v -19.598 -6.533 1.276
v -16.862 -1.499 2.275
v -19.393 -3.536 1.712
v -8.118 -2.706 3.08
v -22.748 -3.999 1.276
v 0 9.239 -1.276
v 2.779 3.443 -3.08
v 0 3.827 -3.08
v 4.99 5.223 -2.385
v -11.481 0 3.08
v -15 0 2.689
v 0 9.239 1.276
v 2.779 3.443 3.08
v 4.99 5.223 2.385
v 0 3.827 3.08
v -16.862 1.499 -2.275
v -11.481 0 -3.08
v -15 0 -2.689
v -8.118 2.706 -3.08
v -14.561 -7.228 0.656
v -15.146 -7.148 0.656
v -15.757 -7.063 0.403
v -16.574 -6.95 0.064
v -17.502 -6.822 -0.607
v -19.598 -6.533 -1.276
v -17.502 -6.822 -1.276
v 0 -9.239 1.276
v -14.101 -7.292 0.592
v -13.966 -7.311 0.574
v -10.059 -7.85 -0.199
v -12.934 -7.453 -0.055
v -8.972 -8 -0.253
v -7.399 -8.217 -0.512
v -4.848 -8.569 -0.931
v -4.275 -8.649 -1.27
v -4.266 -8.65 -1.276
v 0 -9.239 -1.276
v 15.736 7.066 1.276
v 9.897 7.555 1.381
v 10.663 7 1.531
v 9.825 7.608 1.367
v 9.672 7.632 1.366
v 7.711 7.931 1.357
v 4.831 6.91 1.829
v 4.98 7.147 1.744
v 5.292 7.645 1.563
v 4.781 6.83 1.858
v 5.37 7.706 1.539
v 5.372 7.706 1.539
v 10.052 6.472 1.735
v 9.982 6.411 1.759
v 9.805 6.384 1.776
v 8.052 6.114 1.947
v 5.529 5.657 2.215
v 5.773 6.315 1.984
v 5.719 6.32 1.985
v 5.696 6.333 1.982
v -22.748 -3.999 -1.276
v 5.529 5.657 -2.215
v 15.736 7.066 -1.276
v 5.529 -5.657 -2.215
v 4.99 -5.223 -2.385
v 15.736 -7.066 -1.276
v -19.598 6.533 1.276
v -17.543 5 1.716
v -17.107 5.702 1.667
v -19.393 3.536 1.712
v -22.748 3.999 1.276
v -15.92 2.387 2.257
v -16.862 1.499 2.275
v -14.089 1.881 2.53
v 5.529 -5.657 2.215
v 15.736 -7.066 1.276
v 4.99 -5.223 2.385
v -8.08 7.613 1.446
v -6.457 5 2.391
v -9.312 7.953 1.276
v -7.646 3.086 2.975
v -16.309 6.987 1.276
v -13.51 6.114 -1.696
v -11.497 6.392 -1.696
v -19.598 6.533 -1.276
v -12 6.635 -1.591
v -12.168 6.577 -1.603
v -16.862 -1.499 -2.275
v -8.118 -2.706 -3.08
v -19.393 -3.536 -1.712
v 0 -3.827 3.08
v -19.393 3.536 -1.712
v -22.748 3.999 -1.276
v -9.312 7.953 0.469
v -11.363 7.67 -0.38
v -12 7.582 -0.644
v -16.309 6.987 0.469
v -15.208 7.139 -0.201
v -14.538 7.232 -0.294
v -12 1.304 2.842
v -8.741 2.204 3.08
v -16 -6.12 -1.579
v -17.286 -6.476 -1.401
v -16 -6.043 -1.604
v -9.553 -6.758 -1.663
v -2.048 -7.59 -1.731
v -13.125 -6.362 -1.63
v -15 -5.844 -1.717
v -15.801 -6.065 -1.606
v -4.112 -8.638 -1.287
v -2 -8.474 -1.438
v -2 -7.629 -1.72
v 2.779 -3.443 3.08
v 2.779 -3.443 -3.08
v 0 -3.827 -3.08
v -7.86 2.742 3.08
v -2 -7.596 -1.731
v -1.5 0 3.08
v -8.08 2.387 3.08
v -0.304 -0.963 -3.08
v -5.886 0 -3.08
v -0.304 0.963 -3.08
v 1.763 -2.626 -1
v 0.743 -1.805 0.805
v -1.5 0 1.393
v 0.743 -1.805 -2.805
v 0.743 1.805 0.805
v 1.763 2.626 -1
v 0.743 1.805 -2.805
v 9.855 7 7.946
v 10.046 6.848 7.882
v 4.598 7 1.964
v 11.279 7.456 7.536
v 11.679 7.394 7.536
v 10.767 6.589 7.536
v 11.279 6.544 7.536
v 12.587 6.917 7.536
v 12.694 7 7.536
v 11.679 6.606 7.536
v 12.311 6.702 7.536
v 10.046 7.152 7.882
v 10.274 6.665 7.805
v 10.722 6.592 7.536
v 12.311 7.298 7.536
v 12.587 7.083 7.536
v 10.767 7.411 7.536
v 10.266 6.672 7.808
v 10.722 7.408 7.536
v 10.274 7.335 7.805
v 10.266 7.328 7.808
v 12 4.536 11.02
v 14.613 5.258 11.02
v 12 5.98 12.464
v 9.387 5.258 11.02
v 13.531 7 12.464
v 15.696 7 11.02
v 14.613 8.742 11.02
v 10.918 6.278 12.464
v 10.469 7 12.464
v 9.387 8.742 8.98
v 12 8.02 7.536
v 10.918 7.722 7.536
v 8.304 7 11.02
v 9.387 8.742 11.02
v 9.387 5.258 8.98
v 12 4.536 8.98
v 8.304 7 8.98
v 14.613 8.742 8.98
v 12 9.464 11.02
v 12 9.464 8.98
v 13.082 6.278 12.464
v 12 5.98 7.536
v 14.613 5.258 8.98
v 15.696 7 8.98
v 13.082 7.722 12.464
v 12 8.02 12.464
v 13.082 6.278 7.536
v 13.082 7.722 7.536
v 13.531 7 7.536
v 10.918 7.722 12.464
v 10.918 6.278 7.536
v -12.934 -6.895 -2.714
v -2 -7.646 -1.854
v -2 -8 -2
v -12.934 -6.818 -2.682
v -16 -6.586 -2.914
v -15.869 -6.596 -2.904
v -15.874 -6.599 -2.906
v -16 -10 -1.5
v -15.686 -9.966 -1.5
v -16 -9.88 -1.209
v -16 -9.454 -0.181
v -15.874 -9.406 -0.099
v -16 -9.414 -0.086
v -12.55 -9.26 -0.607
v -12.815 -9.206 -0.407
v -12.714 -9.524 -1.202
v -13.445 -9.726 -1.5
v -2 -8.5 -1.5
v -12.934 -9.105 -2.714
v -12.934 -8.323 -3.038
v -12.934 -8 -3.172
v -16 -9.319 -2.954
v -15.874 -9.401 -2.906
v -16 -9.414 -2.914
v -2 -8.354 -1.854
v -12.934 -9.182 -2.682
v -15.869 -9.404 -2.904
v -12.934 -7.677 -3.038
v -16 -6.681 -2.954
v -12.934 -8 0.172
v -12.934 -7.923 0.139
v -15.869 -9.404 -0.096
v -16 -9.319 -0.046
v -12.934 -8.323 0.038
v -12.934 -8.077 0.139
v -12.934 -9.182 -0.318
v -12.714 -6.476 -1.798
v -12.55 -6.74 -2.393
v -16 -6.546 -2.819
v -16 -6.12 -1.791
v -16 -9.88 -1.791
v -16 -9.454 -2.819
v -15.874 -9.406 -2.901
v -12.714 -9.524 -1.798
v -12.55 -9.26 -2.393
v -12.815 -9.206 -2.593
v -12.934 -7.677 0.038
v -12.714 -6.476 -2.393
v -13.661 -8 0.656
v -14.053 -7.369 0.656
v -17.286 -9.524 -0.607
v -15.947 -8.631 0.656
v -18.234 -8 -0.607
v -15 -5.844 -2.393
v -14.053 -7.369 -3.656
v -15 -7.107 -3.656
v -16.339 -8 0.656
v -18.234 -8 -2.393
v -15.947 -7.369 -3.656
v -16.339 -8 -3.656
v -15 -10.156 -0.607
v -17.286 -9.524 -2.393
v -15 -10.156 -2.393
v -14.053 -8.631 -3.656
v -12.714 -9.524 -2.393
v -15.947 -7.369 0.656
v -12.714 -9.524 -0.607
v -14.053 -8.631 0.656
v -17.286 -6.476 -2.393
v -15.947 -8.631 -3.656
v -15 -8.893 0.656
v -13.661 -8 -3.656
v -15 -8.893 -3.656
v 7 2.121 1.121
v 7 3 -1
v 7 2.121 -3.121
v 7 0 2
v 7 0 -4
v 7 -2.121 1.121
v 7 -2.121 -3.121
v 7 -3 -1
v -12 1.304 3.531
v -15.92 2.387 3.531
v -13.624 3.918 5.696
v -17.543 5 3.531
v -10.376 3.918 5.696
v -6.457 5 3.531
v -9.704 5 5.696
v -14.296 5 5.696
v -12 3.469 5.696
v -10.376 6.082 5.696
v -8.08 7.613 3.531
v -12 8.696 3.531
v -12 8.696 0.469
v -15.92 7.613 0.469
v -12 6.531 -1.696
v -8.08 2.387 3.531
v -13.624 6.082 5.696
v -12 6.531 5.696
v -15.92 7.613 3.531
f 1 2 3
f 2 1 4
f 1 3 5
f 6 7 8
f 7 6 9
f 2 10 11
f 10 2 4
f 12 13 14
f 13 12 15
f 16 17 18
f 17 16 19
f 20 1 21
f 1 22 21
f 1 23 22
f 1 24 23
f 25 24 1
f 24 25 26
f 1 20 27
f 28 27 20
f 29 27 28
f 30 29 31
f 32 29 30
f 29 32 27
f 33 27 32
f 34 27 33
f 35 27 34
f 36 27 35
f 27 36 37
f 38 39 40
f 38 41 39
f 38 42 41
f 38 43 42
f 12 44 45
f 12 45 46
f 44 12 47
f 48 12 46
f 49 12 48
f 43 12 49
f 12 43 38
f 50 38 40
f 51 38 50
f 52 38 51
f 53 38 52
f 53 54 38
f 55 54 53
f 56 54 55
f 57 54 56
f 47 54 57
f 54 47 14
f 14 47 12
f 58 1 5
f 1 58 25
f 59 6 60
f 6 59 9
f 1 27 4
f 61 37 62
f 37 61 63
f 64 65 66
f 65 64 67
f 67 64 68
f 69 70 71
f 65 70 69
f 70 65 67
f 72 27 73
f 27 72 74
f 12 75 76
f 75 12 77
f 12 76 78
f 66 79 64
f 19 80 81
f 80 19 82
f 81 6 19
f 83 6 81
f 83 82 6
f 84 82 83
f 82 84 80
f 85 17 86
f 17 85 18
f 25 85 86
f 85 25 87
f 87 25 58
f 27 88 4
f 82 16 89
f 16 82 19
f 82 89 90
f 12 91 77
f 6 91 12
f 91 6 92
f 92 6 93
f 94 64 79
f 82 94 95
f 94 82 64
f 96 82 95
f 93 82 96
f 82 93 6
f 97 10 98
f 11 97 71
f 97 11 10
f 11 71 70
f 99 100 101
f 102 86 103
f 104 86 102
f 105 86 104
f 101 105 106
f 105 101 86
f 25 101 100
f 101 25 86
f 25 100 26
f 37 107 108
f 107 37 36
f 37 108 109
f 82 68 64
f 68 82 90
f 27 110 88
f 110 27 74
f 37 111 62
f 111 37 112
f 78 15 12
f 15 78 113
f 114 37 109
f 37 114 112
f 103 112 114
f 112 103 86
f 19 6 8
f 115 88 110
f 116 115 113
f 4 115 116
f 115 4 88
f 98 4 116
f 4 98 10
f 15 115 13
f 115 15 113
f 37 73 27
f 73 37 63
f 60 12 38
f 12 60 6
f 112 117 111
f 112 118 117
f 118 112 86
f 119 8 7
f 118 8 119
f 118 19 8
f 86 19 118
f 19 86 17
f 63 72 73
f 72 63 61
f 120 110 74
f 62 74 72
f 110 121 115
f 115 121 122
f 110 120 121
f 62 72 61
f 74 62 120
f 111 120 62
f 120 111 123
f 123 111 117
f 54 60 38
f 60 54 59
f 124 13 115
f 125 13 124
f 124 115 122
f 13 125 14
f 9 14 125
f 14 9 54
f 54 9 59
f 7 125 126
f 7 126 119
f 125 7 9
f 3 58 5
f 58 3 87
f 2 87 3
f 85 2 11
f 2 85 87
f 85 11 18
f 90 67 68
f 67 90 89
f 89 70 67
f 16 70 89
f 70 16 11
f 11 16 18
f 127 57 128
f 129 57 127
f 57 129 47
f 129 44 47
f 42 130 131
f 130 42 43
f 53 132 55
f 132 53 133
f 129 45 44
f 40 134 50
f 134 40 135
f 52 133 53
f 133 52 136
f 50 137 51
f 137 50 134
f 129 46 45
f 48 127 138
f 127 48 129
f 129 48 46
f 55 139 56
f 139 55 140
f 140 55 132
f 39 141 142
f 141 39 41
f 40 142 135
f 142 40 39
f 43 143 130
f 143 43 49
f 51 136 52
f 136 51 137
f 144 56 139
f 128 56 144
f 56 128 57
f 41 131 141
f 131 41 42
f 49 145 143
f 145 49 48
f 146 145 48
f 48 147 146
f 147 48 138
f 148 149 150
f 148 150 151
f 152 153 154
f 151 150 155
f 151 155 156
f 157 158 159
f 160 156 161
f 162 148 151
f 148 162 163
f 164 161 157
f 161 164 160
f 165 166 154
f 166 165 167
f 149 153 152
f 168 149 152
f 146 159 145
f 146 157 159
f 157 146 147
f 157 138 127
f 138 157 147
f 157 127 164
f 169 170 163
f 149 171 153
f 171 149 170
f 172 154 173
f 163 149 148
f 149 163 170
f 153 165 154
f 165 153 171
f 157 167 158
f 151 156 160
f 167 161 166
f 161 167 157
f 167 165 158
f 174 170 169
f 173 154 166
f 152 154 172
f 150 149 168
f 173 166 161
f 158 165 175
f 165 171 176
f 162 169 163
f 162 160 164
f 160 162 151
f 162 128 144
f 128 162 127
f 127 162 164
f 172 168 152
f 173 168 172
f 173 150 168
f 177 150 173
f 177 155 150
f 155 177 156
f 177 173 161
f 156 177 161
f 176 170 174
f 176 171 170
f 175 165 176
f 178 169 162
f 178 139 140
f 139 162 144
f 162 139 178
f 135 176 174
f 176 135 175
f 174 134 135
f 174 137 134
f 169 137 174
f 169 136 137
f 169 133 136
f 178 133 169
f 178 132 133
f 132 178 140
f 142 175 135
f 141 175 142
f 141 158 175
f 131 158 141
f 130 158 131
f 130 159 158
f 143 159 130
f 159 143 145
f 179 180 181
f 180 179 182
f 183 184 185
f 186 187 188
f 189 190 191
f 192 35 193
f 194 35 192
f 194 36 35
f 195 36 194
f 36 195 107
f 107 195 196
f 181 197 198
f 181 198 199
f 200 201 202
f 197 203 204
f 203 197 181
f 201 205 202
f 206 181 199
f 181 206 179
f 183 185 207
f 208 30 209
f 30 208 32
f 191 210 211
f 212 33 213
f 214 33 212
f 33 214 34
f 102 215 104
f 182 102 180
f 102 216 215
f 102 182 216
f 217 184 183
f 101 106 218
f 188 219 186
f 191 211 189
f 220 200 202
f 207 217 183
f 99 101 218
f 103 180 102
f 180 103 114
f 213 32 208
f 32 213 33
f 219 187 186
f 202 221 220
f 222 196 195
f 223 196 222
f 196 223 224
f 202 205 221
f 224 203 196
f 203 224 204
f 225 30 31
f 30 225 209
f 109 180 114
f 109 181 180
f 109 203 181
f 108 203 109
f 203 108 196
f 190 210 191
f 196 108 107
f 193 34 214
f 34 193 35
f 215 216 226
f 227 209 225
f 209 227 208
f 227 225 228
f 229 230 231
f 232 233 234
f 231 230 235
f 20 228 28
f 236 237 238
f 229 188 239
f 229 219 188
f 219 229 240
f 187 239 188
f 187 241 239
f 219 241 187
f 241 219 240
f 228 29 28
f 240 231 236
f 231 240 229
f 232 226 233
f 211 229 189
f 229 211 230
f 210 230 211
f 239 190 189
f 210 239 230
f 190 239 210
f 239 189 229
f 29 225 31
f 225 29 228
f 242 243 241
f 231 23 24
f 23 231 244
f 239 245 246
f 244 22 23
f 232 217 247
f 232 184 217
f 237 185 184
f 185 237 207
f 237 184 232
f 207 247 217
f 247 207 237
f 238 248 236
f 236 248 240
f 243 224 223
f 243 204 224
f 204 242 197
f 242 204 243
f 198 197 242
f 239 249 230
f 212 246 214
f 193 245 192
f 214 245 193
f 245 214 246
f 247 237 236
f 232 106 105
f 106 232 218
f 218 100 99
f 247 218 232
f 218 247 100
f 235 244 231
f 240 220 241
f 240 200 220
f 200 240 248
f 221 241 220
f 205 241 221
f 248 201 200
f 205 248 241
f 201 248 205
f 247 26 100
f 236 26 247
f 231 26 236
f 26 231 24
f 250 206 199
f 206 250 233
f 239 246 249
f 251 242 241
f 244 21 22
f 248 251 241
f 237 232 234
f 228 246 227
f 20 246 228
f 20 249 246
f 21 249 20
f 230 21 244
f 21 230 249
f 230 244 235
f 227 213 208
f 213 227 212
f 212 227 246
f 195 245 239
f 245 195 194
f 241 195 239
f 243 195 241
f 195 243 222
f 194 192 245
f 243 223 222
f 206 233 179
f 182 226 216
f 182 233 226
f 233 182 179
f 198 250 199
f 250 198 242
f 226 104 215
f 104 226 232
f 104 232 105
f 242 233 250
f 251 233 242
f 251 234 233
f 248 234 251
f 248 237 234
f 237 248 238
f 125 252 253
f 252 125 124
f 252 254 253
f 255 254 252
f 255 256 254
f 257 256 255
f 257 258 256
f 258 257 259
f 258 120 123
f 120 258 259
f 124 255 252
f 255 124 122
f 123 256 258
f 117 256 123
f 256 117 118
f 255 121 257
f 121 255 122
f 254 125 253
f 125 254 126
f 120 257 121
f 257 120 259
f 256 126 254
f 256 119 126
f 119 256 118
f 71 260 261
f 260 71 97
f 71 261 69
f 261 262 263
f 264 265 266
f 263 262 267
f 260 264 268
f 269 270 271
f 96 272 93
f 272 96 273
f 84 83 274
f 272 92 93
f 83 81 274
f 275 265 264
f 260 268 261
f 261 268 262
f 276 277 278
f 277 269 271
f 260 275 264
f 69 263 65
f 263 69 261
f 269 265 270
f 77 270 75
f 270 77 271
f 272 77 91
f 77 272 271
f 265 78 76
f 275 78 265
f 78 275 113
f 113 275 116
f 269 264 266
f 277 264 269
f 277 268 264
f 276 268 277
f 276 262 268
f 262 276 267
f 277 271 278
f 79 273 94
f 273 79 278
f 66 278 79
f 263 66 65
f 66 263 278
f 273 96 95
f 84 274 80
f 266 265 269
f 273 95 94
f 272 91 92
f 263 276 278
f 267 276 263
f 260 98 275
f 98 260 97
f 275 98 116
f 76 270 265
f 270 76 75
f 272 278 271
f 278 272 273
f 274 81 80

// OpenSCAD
$fn = 8;

module flattened_cylinder(rad1, rad2, height, flatness)
{
	scale(v = [1, 1 / flatness, 1])
		cylinder(h = height , r1 = rad1, r2 = rad2, center = true);
	
}

module flattened_sphere(radius, flatness)
{
	scale(v = [1, 1, 1 / flatness])
		sphere(r = radius);
}

module long_sphere(radius, longness)
{
	scale(v = [1, 1 / longness, 1 / longness])
		sphere(r = radius);
}

module flat_cyl(height, rad1, rad2, flatness)
{
	scale(v = [1, 1 / flatness, 1])
		cylinder(h = height, r1 = rad1, r2 = rad2, center = true);
}

module fuselage(sz) {
	scale(v = [1.5, 1, 1])
	difference() {
		scale(v = [2, 1, 1])
			flattened_sphere(sz, 3);
	translate(v = [-sz * 1.5, 0, 0])
		scale(v = [2, 1, 1])
			cylinder(h = sz, r1 = sz * 0.8, r2 = sz * 0.8, center = true);
	translate(v = [sz * 2, 0, 0])
		scale(v = [2, 1, 1])
			cylinder(h = sz, r1 = sz * 0.5, r2 = sz * 0.5, center = true);
	}
}

rotate(a = 180, v = [0, 0, 1])
union() {
fuselage(10);
rotate(a = -30, v = [0, 1, 0])
translate(v = [-6, -7, 9])
flat_cyl(10, 3, 1, 3);
translate(v = [-12, -7, 10])
long_sphere(4, 1.5);

translate(v = [9, 8, -1.5])
rotate(a = 90, v = [0, 1, 0])
cylinder(h = 14, r1 = 0.5, r2 = 2, center = true);
translate(v = [15, 8, -1.5])
long_sphere(3.5, 1.5);

translate(v = [0, 0, -1])
rotate(a = 90, v = [0, 1, 0])
cylinder(h = 14, r1 = 3, r2 = 2, center = true);

translate(v = [12, -5, 2])
long_sphere(6, 1.5);
}
